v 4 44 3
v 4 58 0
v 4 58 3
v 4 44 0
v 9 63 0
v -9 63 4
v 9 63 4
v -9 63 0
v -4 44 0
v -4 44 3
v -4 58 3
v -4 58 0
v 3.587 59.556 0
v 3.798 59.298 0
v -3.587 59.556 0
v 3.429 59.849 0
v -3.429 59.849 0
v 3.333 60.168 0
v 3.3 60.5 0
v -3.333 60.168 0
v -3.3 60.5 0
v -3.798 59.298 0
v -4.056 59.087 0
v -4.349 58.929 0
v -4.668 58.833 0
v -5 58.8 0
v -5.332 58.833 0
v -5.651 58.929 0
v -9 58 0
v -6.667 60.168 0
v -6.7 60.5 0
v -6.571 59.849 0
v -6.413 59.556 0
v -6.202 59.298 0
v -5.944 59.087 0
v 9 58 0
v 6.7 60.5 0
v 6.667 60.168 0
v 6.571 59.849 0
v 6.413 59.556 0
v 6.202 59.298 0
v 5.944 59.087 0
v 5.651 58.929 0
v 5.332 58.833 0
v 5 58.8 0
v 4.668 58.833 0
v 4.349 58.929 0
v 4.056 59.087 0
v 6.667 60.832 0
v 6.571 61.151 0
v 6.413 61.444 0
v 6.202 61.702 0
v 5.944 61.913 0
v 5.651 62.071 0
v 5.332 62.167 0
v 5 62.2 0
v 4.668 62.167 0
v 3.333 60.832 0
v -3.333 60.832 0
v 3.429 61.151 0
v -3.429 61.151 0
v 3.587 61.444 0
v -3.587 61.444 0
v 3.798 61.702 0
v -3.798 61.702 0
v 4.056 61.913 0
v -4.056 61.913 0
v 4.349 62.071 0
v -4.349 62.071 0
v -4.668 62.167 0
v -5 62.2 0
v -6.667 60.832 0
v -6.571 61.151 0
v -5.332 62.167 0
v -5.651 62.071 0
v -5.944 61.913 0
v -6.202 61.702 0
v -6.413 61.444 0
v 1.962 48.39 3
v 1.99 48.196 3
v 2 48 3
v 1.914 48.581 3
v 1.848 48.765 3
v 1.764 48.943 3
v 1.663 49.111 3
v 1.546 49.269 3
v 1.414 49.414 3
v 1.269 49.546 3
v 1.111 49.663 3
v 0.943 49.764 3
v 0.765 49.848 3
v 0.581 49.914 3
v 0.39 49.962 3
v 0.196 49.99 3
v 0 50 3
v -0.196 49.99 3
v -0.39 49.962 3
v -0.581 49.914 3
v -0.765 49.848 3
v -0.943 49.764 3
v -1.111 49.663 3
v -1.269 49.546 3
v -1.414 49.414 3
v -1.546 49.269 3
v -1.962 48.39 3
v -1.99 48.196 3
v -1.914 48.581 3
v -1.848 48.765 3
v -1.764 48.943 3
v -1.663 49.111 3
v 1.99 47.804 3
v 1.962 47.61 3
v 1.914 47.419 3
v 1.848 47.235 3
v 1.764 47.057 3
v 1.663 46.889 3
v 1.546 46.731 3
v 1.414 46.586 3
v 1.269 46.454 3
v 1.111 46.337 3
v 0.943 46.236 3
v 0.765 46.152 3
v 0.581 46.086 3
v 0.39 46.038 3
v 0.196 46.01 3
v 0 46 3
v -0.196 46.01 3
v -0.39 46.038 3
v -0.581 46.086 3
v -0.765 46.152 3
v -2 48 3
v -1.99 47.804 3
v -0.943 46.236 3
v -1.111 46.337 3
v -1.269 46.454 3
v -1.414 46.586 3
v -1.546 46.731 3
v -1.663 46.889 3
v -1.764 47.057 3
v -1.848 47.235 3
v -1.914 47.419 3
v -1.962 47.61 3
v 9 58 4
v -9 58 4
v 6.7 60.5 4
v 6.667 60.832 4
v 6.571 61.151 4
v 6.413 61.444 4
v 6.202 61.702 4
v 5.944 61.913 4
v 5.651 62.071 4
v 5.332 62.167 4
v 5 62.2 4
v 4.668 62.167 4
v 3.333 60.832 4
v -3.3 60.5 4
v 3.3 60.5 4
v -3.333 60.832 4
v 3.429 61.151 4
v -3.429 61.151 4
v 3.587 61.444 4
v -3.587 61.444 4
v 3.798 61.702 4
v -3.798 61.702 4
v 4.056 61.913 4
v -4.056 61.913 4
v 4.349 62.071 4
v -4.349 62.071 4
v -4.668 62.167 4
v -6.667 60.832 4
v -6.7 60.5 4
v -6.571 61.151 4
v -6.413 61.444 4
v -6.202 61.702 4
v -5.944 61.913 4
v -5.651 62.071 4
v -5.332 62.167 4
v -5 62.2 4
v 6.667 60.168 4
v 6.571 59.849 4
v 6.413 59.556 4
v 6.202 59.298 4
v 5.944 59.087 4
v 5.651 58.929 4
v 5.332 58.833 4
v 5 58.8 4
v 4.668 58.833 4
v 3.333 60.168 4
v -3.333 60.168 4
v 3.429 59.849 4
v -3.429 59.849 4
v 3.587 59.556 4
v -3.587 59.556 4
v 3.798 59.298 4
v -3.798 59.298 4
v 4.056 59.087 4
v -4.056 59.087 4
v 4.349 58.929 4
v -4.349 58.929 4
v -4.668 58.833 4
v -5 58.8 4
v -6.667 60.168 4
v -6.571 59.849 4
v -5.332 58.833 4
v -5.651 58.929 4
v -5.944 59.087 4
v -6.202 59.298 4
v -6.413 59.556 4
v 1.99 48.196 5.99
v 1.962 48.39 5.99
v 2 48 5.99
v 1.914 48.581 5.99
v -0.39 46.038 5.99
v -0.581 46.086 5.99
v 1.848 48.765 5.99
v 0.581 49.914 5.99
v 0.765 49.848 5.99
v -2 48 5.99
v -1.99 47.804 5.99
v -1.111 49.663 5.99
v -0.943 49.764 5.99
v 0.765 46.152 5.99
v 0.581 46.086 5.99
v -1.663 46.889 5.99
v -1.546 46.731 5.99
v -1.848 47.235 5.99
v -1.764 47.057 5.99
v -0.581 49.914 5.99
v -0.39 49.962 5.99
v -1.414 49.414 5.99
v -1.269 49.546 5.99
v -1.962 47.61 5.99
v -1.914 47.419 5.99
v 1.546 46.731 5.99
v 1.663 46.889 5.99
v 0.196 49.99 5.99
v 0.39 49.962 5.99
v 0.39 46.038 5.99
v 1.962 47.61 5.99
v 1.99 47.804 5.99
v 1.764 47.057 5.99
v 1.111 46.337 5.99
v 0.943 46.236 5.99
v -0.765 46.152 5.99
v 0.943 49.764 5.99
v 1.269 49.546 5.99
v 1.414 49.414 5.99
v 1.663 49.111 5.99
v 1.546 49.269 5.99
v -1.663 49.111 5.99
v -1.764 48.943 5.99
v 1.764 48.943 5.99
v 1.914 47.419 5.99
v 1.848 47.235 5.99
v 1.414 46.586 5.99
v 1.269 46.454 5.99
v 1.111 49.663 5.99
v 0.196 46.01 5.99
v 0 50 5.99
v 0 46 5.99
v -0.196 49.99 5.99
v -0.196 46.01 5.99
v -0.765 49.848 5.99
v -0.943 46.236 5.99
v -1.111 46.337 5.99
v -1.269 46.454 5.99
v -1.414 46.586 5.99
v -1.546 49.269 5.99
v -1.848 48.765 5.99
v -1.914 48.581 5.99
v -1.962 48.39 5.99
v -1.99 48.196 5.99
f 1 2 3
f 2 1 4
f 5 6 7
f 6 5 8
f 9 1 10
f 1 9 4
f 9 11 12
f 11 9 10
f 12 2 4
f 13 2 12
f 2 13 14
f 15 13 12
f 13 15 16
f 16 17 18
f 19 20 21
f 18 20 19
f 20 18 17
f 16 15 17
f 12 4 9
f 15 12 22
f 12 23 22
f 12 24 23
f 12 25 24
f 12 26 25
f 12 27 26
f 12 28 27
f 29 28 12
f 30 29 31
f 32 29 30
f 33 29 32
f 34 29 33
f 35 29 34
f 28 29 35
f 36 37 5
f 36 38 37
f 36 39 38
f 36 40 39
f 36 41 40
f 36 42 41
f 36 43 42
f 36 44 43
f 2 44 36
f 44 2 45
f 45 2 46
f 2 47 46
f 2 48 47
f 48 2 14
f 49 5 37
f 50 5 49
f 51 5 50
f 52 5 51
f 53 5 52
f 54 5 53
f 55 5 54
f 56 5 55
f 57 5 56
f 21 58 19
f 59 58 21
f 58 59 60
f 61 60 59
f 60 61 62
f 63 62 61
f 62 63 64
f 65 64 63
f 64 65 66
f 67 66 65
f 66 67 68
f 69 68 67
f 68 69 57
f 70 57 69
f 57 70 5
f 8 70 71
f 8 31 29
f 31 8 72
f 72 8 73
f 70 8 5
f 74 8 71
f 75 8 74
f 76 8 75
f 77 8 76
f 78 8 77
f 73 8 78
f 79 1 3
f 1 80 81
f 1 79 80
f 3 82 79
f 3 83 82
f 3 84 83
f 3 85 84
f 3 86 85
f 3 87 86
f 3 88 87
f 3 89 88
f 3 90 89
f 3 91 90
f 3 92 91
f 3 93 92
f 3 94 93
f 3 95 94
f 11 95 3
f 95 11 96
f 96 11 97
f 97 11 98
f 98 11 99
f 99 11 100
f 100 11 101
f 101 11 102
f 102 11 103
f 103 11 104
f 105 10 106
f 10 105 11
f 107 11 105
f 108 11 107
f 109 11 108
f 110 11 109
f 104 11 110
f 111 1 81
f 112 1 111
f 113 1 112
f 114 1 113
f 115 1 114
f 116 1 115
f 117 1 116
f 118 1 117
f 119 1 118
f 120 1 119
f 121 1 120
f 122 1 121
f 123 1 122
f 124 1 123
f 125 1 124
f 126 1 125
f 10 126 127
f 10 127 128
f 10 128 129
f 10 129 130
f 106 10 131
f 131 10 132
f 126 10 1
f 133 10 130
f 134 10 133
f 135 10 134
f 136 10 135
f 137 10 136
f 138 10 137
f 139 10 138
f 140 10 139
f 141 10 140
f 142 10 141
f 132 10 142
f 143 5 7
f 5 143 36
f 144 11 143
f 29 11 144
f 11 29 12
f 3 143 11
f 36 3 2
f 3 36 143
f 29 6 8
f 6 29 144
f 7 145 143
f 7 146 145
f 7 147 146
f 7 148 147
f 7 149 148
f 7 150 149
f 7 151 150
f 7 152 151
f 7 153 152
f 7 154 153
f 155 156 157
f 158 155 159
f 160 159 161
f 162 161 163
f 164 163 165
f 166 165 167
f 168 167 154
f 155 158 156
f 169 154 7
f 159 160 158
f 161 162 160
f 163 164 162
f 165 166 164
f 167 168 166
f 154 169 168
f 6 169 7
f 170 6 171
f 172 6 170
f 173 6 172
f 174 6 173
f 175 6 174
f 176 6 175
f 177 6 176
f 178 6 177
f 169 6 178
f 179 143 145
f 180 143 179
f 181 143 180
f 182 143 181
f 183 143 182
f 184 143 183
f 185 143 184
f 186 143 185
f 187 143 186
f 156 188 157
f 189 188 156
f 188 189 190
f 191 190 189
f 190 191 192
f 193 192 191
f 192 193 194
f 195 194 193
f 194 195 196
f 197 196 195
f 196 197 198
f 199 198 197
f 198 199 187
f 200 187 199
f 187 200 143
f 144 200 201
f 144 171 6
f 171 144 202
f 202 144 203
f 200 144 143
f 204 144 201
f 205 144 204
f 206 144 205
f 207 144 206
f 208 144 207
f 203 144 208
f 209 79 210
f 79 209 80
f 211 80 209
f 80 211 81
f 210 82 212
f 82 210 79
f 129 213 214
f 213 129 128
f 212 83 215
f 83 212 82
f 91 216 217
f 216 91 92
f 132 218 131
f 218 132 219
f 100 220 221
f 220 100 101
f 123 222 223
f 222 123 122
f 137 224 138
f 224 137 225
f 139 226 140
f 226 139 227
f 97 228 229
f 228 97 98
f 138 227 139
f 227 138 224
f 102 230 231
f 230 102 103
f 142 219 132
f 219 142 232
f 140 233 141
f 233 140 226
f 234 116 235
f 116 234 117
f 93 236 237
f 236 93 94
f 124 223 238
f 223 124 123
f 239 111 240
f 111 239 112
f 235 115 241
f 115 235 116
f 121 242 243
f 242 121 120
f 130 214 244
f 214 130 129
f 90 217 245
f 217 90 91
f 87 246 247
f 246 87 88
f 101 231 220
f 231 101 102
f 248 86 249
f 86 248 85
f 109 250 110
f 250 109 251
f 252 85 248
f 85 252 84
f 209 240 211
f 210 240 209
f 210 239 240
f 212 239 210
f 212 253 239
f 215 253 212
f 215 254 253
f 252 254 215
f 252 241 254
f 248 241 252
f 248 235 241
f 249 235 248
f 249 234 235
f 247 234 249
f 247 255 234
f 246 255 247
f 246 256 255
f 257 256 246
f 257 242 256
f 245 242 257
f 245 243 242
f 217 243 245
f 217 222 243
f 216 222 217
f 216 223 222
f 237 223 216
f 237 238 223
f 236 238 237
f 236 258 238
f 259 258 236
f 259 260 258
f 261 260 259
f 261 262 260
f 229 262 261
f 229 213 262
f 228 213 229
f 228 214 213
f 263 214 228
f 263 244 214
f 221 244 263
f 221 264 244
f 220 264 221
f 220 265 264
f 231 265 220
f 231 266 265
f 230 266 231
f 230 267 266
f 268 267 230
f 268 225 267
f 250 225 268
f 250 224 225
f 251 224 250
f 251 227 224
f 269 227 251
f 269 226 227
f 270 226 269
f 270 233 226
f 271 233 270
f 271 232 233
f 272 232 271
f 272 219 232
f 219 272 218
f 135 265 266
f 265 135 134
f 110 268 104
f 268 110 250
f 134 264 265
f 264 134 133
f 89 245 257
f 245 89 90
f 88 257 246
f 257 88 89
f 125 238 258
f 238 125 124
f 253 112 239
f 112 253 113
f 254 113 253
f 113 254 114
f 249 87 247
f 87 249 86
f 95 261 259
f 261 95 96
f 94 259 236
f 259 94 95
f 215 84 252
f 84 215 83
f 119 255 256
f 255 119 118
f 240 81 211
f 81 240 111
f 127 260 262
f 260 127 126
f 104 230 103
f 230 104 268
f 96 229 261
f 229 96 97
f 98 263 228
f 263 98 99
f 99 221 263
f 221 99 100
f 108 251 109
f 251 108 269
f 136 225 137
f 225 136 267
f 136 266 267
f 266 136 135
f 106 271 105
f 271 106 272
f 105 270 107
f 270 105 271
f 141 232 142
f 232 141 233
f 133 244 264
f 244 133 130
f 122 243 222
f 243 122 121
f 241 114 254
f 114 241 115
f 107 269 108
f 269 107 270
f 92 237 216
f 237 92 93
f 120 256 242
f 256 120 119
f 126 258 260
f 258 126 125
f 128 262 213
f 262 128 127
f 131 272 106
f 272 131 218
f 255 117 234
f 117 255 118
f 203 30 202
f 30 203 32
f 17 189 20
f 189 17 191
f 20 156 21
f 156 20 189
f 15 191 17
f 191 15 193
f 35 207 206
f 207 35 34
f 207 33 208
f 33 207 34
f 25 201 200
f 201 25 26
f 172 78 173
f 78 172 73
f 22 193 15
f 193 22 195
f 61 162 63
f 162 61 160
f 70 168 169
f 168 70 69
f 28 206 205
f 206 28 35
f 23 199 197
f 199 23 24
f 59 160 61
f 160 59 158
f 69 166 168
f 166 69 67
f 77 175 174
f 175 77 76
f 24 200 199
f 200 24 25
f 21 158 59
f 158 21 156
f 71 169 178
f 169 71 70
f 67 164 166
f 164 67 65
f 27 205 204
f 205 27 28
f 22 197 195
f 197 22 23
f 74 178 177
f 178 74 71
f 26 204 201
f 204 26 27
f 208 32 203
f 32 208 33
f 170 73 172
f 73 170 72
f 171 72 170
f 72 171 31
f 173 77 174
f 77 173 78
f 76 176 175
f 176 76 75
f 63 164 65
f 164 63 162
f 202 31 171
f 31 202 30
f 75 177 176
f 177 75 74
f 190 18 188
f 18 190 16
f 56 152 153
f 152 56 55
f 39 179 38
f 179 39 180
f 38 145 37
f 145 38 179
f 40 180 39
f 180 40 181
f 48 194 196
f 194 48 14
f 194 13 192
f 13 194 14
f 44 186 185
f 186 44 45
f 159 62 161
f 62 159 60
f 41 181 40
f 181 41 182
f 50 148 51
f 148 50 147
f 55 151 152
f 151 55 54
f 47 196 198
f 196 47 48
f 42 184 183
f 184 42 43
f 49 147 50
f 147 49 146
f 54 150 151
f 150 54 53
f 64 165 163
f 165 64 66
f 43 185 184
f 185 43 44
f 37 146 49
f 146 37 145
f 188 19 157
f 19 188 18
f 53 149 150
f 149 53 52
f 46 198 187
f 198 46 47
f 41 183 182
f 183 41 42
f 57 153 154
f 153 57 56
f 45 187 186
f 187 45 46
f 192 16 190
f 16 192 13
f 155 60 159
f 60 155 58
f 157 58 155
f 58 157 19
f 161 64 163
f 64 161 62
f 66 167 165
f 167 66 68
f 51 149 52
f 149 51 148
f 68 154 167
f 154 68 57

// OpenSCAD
// file: ../port_tower.scad
// ============================================================
//  Female port tower: positioning stage (rotated 180 deg so its
//  payload face looks toward -Y) + bracket plate with the keyed
//  D-hole. The bulkhead goes in from the back (flange behind the
//  plate), nut on the front. Plate front face is at world y=0.
// ============================================================
include <stage.scad>

bracket_w      = 36;
bracket_hole_dz = port_z - stage_payload_z;   // hole above payload centre
bracket_bot    = -zs_h / 2;
bracket_top    = bracket_hole_dz + bh_nut_af / cos(30) / 2 + 3;
rib_t          = 5;     // rib width (X)
rib_d          = 7;     // rib depth (out of the plate front)

// Payload-face coordinates: origin at face centre, +Y away from the stage.
module port_bracket() {
    difference() {
        union() {
            translate([-bracket_w / 2, 0, bracket_bot]) cube([bracket_w, plate_t, bracket_top - bracket_bot]);
            // stiffening ribs, outboard of the nut and clear of the plug clamp
            for (sx = [-1, 1])
                translate([sx > 0 ? bracket_w / 2 - rib_t : -bracket_w / 2, plate_t - 0.01, bracket_bot])
                    hull() {
                        cube([rib_t, rib_d, 1]);
                        translate([0, 0, bracket_hole_dz - 14]) cube([rib_t, 0.01, 1]);
                    }
        }
        // keyed D-hole, flat on top
        translate([0, plate_t, bracket_hole_dz]) rotate([90, 0, 0]) d_hole(t = plate_t);
        // mounting screws into the z-slider's captive nuts
        for (p = payload_pts) translate([p[0], -0.01, p[1]]) rotate([-90, 0, 0]) {
            screw_hole(m3_d, plate_t + rib_d);
        }
    }
}

// Whole tower in world coordinates at fine-travel offset (dx, dz),
// measured in world X / Z.
// Tower B (i=1) is the mirror image so its X adjust screw faces outward.
module port_tower_world(i, dx = 0, dz = 0) {
    ldx = i == 0 ? -dx : dx;   // world dx -> stage-local dx
    translate([tower_x(i), tower_y, 0]) rotate([0, 0, 180]) stage_hand(i == 1) {
        stage_assembly(ldx, dz, base = false); // base is part of the X base
        stage_payload_origin(ldx, dz) show("port_bracket") color("Orange") port_bracket();
    }
}

// Bulkhead connector stand-in (for checks / preview), world coords.
module bulkhead_world(i, dx = 0, dz = 0) {
    translate([port_x[i] + dx, port_face_y, port_z + dz]) rotate([90, 0, 0]) show("bulkhead") color("DimGray") {
        cylinder(d = bh_thread_d, h = bh_thread_len - plate_t);                   // thread + face
        cylinder(d = bh_nut_af / cos(30), h = bh_nut_t, $fn = 6);                  // nut
        translate([0, 0, -plate_t - 2]) cylinder(d = bh_flange_d, h = 2);          // flange
        translate([0, 0, -plate_t - 40]) cylinder(d = 14, h = 38);                 // body
    }
}

echo("CHECK", "port_z", port_z);
// file: ../plug_mount.scad
// ============================================================
//  Male plug mount: flexure (frame + 4 L-beams + floating island with
//  the clamp cradle built in), clamp cap, and two identical stop
//  straps (front + back) whose pins limit X/Z float to +/-flex_float
//  and whose 1 mm standoff limits Y float to +/-flex_stop_gap.
//  Local coords: origin at the stage payload face centre, +Y away from
//  the stage, Z relative to the payload centre.
// ============================================================
include <port_tower.scad>
include <axes.scad>

plug_dz = port_z - (yc_top + stage_payload_z); // plug centre above payload centre
blk_x = plug_bx / 2 + 0.1; // snug in X
blk_y0 = flex_t + clamp_wall; // block back face
blk_y1 = blk_y0 + plug_by; // block front face
blk_z0 = plug_dz + plug_drop; // block bottom
blk_z1 = blk_z0 + plug_block[2];
crad_x = blk_x + 5; // cradle half width
crad_y1 = blk_y1 - 0.4; // cradle stops short: cap clamps the block
cap_back_y = crad_y1;
crad_scr = blk_x + 2.5; // cradle screw X
lip_in = plug_bx / 2 - 0.45; // top lips overlap the block by 0.55 mm
relief_hole_d = 7; // through the lips, centred on the cable

isl_x = 19; // island half width
isl_z0 = blk_z0 - 1;
isl_z1 = isl_z0 + flex_isl_h;
flex_g = 6; // island-to-frame gap
in_x = isl_x + flex_g;
in_z0 = isl_z0 - flex_g;
in_z1 = isl_z1 + flex_g;
fr_bar = 5;
fr_x = in_x + fr_bar;
fr_z0 = -zs_h / 2;
fr_z1 = in_z1 + fr_bar;

pin_d = 4;
pin_z = isl_z1 - 4;
pin_hole = pin_d + 2 * flex_float;
strap_w = 8;
strap_t = 3;
strap_foot_w = 18;
strap_z0 = pin_z - 4;
strap_scr = [-5, 5]; // strap screw X (through the top bar)
strap_scr_z = (in_z1 + fr_z1) / 2;

// one L-beam: island bottom face -> down -> outward -> up -> frame side
leg = 3;
function beam_path(sx, sz) =
  let (
    zc = (isl_z0 + isl_z1) / 2,
    zi = sz < 0 ? isl_z0 : isl_z1,
    zh = zi + sz * leg,
    zv = zc + sz * (flex_g - 2 + 0.5),
    xv = sx * (isl_x + leg)
  ) [[sx * 10, zi], [sx * 10, zh], [xv, zh], [xv, zv], [sx * in_x, zv]];

module poly_beam(pts, w) {
  for (k = [0:len(pts) - 2])
    hull() {
      translate(pts[k]) square(w, center=true);
      translate(pts[k + 1]) square(w, center=true);
    }
}

// XZ outline helpers: 2D (x, z) extruded along +Y from y0, thickness t
module xz_extrude(y0, t, convexity=4) { translate([0, y0 + t, 0]) rotate([90, 0, 0]) linear_extrude(height=t, convexity=convexity) children(); }

module plug_flexure() {
  difference() {
    union() {
      xz_extrude(0, flex_t) {
        difference() {
          translate([-fr_x, fr_z0]) square([2 * fr_x, fr_z1 - fr_z0]);
          translate([-in_x, in_z0]) square([2 * in_x, in_z1 - in_z0]);
        }
        translate([-isl_x, isl_z0]) square([2 * isl_x, isl_z1 - isl_z0]);
        for (sx = [-1, 1], sz = [-1, 1]) poly_beam(beam_path(sx, sz), flex_beam_w);
      }
      // clamp cradle on the island front: back wall + side walls
      translate([-crad_x, flex_t - 0.01, blk_z0]) cube([2 * crad_x, clamp_wall + 0.01, plug_block[2]]);
      for (sx = [-1, 1])
        translate([sx > 0 ? blk_x : -crad_x, blk_y0 - 0.01, blk_z0])
          cube([crad_x - blk_x, crad_y1 - blk_y0 + 0.01, plug_block[2]]);
      // Z retention: lips over the block's top corners, leaving a slot for
      // the cable. Nothing under the block: the plug's bent body hangs below.
      for (sx = [-1, 1])
        translate([sx > 0 ? lip_in : -crad_x, blk_y0 - 0.01, blk_z1])
          cube([crad_x - lip_in, crad_y1 - blk_y0 + 0.01, 1.5]);
    }
    // hole through the top lips for the cable strain relief (the plug goes
    // in from below)
    translate([0, blk_y0 + plug_by / 2, blk_z1 - 0.01]) cylinder(d=relief_hole_d, h=1.5 + 0.02);
    // payload screws into the stage z-slider
    for (p = payload_pts) translate([p[0], -0.5, p[1]]) rotate([-90, 0, 0]) screw_hole(m3_d, flex_t + 1);
    // stop-pin hole (through) and strap screws (through the top bar)
    translate([0, -0.5, pin_z]) rotate([-90, 0, 0]) screw_hole(pin_hole, flex_t + 1);
    for (x = strap_scr) translate([x, -0.5, strap_scr_z]) rotate([-90, 0, 0]) screw_hole(m3_d, flex_t + 1);
    // cap screws, tapped into the cradle side walls
    for (sx = [-1, 1])
      translate([sx * crad_scr, crad_y1 + 0.01, (blk_z0 + blk_z1) / 2])
        rotate([90, 0, 0]) screw_hole(m3_tap, crad_y1 - flex_t + 1);
  }
}

// Clamp cap: 1.5 mm over the block, thicker over the screws.
module plug_clamp_cap() {
  // flat back at the cradle front: squeezes the block (it stands 0.4 proud)
  difference() {
    union() {
      translate([-crad_x, cap_back_y, blk_z0]) cube([2 * crad_x, blk_y1 - cap_back_y + clamp_lip_t, plug_block[2]]);
      for (sx = [-1, 1])
        translate([sx > 0 ? blk_x : -crad_x, cap_back_y, blk_z0])
          cube([crad_x - blk_x, 4, plug_block[2]]);
    }
    for (sx = [-1, 1])
      translate([sx * crad_scr, cap_back_y - 0.01, (blk_z0 + blk_z1) / 2])
        rotate([-90, 0, 0]) screw_hole(m3_d, 5);
  }
}

// Stop strap in its own frame: back face on y=0, pin toward -Y.
module plug_flex_stop() {
  difference() {
    union() {
      translate([-strap_w / 2, 0, strap_z0]) cube([strap_w, strap_t, fr_z1 - strap_z0]);
      translate([-strap_foot_w / 2, -flex_stop_gap, in_z1]) cube([strap_foot_w, strap_t + flex_stop_gap, fr_z1 - in_z1]);
      translate([0, 0.01, pin_z]) rotate([90, 0, 0]) cylinder(d=pin_d, h=flex_stop_gap + 2);
    }
    for (x = strap_scr)
      translate([x, -flex_stop_gap - 0.5, strap_scr_z]) rotate([-90, 0, 0])
          screw_hole(m3_d, strap_t + flex_stop_gap + 1);
  }
}

module plug_flex_stops_placed() {
  translate([0, flex_t + flex_stop_gap, 0]) plug_flex_stop(); // front
  translate([0, -flex_stop_gap, 0]) mirror([0, 1, 0]) plug_flex_stop(); // back
}

// The plug, as separate pieces so a slide-in path can be swept piecewise:
// each piece is hulled with a copy moved by the vector sweep.
module plug_body_pieces(sweep = [0, 0, 0], relief = true) {
  module sw() { hull() { children(); translate(sweep) children(); } }
  sw() translate([-plug_bx / 2, blk_y0, blk_z0]) cube([plug_bx, plug_by, plug_block[2]]);
  if (relief) sw() translate([0, blk_y0 + plug_by / 2, blk_z1]) cylinder(d=plug_cable_d, h=15); // cable strain relief
  sw() hull() {
    translate([-plug_bx / 2, blk_y0, plug_dz - 4]) cube([plug_bx, plug_by, blk_z0 - plug_dz + 4]);
    translate([0, blk_y1 + plug_head_proj - 1, plug_dz]) rotate([-90, 0, 0]) cylinder(d=8, h=1);
  }
}
module plug_body_local() { show("usb_plug") color("White") plug_body_pieces(); }

// Everything that moves with the plug carriage, minus the plug itself.
module plug_mount_world(x_pos, y_pos, dx = 0, dz = 0) {
  o = ms_origin(x_pos, y_pos);
  translate(o) {
    stage_assembly(dx, dz, base = false); // base is part of the Y carriage
    stage_payload_origin(dx, dz) {
      show("plug_flexure") color("Orange") plug_flexure();
      show("plug_clamp_cap") color("Gold") plug_clamp_cap();
      show("plug_flex_stop") color("Khaki") plug_flex_stops_placed();
    }
  }
}
module plug_body_world(x_pos, y_pos, dx = 0, dz = 0) {
  o = ms_origin(x_pos, y_pos);
  translate(o) stage_payload_origin(dx, dz) plug_body_local();
}

// ---- checks ----
echo("CHECK", "clamp_lip_t", clamp_lip_t);
echo("CHECK", "clamp_preload", blk_y1 - cap_back_y);
echo("CHECK", "clamp_x_play", blk_x - plug_bx / 2);
echo("CHECK", "pillar_above_flex", pillar_top - (yc_top + stage_payload_z + fr_z1));
echo("CHECK", "clamp_bottom_above_plug", blk_z0 - plug_dz);
echo("CHECK", "clamp_lip_overlap", blk_x - lip_in);
// lip left over the block in front of / behind the relief hole (Y)
echo("CHECK", "lip_hold_y", (plug_by - relief_hole_d) / 2);
echo(
  "CHECK", "plug_insert_err",
  (ms_origin(0, y_travel)[1] + payload_face_y + blk_y1 + plug_head_proj) - bh_face_y
);
echo("CHECK", "flex_xz_stop", (pin_hole - pin_d) / 2);
// beam-to-island and beam-to-frame clearance must exceed the stop travel
echo("CHECK", "flex_beam_clear", leg - flex_beam_w / 2);
// main file
// Flexure stop strap: one in front of the flexure, one behind, held by
// the same 2x M3x16 + nuts through the flexure's top bar. Qty 2.
// Print flat with the pin pointing up.
include <../plug_mount.scad>
rotate([-90, 0, 0]) translate([0, -strap_t, 0]) plug_flex_stop();
